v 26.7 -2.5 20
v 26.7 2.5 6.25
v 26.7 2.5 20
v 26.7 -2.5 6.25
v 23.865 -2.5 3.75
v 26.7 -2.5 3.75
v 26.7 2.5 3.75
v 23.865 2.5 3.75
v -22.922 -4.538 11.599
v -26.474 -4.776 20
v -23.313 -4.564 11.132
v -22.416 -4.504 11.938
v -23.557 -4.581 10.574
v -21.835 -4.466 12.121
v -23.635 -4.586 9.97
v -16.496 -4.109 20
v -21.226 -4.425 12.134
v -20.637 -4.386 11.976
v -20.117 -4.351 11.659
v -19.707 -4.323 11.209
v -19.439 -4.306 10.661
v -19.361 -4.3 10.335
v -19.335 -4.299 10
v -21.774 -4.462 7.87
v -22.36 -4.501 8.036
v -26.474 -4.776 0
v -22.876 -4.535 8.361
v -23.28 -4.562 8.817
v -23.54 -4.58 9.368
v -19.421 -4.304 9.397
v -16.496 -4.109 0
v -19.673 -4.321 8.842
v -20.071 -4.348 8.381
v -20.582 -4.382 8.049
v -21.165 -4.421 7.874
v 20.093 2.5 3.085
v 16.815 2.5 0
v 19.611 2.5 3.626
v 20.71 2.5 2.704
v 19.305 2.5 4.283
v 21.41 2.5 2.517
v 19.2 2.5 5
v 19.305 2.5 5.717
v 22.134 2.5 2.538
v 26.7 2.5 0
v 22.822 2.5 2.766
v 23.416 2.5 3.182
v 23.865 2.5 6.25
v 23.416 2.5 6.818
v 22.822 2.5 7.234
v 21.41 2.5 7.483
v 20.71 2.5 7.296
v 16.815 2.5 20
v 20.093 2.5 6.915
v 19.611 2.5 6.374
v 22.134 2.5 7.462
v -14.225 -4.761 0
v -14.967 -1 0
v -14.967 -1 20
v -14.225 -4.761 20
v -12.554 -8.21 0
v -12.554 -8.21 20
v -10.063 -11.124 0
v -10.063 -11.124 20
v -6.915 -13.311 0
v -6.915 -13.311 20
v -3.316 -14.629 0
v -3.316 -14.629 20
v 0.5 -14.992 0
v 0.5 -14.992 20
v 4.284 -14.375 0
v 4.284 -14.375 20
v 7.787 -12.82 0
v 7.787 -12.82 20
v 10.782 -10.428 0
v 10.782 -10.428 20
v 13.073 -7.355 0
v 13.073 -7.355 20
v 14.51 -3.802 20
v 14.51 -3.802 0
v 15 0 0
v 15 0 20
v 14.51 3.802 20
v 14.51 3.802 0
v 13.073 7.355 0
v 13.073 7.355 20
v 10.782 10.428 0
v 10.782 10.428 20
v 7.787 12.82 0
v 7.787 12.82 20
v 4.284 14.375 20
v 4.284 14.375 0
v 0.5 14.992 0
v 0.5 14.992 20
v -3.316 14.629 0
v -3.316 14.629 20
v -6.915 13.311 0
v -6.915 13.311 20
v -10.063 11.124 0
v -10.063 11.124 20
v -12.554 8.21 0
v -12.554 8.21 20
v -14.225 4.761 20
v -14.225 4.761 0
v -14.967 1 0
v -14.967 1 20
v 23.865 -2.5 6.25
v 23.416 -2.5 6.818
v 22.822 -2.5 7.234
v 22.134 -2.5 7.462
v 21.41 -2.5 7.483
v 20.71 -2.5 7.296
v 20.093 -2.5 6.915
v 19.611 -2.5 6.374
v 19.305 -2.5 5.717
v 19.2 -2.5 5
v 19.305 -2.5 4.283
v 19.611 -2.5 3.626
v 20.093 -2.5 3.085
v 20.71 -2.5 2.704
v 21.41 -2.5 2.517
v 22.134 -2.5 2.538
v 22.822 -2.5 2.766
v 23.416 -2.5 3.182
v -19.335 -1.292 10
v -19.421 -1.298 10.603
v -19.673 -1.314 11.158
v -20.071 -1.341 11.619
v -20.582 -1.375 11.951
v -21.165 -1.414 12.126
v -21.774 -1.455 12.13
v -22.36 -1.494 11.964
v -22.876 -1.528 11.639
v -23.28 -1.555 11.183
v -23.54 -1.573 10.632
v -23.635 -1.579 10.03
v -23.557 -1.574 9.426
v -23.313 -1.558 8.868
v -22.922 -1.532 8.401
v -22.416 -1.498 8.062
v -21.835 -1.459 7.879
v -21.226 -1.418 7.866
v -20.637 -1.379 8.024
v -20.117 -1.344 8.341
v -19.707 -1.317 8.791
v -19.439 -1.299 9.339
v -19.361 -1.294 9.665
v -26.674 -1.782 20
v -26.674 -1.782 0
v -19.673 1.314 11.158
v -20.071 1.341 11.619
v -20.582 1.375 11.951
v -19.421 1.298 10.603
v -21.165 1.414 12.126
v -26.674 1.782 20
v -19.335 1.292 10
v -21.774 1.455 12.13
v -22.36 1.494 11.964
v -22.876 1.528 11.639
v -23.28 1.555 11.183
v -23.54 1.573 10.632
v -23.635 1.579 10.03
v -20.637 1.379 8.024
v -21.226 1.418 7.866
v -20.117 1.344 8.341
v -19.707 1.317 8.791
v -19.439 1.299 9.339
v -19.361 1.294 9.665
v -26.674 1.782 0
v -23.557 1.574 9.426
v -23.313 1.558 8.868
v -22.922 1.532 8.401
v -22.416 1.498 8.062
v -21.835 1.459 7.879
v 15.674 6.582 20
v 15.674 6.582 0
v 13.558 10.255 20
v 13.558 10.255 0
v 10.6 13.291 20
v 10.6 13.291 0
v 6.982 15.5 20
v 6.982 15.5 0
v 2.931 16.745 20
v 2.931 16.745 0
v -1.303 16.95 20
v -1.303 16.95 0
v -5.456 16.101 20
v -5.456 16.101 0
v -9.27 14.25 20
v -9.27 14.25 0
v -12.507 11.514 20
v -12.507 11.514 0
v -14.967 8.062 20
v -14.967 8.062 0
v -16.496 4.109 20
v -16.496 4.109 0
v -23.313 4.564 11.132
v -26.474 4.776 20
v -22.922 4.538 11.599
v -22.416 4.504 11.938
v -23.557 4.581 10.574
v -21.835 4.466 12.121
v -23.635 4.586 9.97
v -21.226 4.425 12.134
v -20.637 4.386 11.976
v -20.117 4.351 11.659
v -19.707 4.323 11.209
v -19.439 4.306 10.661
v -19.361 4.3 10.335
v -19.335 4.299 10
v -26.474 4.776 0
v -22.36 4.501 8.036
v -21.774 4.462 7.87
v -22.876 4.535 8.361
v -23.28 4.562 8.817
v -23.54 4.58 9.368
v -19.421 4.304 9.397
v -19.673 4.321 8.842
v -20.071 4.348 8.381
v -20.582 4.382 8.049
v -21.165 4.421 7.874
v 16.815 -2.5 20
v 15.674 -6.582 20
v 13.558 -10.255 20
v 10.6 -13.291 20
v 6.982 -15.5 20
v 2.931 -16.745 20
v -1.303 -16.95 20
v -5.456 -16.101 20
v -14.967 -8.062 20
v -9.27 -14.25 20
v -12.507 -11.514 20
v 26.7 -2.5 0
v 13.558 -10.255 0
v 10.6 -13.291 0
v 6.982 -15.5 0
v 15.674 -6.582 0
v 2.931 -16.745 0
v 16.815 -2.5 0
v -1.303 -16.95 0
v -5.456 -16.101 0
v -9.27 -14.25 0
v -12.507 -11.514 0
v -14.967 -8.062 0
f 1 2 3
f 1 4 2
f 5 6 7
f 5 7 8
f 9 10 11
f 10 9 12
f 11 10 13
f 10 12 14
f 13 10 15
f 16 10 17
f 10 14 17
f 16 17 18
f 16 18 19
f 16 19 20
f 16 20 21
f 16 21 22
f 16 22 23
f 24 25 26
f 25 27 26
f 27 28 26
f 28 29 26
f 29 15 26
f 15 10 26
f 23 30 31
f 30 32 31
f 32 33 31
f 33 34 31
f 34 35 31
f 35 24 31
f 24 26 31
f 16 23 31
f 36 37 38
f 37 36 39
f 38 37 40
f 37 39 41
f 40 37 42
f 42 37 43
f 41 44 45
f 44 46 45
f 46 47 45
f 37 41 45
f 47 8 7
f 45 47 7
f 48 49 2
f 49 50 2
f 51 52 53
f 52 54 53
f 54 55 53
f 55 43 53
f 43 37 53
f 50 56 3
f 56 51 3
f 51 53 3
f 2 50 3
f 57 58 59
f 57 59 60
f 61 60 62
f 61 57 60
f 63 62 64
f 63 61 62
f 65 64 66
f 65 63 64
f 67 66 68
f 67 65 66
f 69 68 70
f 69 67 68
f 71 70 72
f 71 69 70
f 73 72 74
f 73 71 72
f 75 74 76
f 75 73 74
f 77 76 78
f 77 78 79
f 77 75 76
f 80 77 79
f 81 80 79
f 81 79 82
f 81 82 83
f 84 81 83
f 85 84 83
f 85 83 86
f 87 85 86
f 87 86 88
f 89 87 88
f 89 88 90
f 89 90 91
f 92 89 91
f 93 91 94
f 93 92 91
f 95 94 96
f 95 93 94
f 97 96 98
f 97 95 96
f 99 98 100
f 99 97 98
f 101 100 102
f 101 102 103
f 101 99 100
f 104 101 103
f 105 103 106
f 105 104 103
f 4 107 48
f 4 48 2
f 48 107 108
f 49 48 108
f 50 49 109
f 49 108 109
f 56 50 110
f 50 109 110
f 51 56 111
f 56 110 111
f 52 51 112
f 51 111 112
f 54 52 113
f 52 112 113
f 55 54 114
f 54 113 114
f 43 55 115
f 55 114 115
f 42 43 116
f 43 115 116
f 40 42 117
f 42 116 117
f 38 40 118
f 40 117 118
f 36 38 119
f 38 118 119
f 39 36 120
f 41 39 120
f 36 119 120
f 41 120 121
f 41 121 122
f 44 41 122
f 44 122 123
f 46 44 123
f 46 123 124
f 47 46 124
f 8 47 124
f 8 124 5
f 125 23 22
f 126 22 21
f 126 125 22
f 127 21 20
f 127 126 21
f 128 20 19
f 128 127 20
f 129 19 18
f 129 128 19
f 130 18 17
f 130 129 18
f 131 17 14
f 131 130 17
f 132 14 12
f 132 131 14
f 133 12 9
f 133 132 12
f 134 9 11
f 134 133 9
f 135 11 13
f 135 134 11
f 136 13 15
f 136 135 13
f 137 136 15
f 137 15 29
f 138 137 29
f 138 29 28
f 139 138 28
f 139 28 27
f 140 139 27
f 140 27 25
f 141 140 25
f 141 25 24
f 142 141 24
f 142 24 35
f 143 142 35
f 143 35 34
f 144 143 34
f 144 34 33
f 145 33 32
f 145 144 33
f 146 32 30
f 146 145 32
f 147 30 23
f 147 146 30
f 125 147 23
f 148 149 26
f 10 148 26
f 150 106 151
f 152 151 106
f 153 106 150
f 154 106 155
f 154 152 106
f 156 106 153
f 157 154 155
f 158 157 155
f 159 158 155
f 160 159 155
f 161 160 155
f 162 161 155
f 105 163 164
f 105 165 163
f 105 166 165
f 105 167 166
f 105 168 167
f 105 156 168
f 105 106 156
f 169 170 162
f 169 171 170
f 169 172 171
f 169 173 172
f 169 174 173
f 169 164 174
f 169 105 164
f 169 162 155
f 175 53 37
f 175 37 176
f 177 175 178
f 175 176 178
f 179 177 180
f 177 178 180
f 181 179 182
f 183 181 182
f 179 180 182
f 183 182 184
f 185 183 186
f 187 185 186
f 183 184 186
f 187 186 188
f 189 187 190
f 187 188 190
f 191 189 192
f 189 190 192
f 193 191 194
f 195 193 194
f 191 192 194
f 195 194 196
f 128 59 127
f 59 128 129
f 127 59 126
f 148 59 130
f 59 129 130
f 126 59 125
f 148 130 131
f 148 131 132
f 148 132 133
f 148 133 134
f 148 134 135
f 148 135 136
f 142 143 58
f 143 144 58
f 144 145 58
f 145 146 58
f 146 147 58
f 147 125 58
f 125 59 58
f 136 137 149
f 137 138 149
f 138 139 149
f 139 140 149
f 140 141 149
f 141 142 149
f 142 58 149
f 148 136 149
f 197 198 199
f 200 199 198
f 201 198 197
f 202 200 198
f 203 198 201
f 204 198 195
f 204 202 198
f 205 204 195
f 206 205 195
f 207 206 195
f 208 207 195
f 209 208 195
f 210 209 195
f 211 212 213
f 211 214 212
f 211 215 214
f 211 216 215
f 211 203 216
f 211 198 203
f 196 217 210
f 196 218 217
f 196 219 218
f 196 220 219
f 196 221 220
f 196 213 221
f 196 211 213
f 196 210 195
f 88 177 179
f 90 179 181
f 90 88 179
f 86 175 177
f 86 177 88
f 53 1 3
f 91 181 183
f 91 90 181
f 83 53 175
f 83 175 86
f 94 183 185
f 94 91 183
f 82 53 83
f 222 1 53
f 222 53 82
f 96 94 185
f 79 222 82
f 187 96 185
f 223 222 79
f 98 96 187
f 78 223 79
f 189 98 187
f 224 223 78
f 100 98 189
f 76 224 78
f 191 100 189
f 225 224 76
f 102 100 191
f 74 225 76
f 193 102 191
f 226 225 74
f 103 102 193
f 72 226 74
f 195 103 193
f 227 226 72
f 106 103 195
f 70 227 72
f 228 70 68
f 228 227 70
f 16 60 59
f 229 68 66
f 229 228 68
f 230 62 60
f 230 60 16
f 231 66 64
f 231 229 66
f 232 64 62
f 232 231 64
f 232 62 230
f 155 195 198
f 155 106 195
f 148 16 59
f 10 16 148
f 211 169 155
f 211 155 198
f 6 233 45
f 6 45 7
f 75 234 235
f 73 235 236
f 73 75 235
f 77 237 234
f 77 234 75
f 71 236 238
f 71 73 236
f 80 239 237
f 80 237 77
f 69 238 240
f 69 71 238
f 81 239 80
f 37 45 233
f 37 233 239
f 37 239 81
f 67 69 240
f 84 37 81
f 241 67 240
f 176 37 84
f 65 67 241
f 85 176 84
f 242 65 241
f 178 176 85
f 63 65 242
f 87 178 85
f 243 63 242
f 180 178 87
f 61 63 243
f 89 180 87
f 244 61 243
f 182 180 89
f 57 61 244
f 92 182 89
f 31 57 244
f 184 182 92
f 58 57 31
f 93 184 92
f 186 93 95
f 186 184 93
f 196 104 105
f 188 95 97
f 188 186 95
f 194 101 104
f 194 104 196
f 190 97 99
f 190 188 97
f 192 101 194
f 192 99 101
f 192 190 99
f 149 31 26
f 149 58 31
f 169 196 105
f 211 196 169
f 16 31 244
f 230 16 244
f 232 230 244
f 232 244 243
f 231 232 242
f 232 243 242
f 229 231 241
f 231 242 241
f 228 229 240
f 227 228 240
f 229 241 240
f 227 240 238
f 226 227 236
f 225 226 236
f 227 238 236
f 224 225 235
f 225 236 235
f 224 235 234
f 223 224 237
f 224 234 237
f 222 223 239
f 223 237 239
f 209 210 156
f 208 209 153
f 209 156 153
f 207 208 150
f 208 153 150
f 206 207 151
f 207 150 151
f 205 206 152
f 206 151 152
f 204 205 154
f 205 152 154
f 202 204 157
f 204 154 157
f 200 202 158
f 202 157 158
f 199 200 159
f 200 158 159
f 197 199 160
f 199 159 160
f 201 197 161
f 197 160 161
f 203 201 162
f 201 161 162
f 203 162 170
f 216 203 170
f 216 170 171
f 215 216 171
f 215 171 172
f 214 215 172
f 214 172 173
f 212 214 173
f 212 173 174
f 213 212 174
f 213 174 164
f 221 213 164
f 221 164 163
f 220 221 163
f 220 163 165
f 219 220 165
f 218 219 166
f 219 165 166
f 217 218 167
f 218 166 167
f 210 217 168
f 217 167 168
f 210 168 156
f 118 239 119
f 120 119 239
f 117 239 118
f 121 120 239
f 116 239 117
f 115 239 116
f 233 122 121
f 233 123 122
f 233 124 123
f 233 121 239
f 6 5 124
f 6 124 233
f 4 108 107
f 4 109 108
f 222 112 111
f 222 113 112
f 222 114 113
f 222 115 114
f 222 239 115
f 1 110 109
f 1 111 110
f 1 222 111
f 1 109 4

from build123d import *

# Parameters (mm, degrees)
PAD_DEPTH         = 20
SKETCH001_R       = 2.15
POCKET_DEPTH      = 17.001
POCKET_DEPTH_BACK = -17.001
PAD001_DEPTH      = 2.5


with BuildPart() as part:
    # Sketch → Pad (new body)
    with BuildSketch(Plane.XY):
        with BuildLine():
            ThreePointArc((-14.96663, -1), (15, 0), (-14.96663, 1))
            Line((-14.96663, 1), (-26.673727, 1.782213))
            Line((-26.673727, 1.782213), (-26.473727, 4.775539))
            Line((-26.473727, 4.775539), (-16.495974, 4.108873))
            ThreePointArc((-16.495974, -4.108873), (17, 0), (-16.495974, 4.108873))
            Line((-26.473727, -4.775539), (-16.495974, -4.108873))
            Line((-26.673727, -1.782213), (-26.473727, -4.775539))
            Line((-14.96663, -1), (-26.673727, -1.782213))
        make_face()
    extrude(amount=PAD_DEPTH)

    # Sketch001 → Pocket (cut, two sides)
    with BuildSketch(Plane.XZ) as pocket_sk:
        with Locations((-21.484851, 10)):
            Circle(SKETCH001_R)
    extrude(amount=-POCKET_DEPTH, mode=Mode.SUBTRACT)
    extrude(pocket_sk.sketch, amount=-POCKET_DEPTH_BACK, mode=Mode.SUBTRACT)

    # Sketch002 → Pad001 (join, symmetric)
    with BuildSketch(Plane.XZ):
        with BuildLine():
            Line((16.7, 20), (16.7, 0))
            Line((16.7, 0), (26.7, 0))
            Line((26.7, 0), (26.7, 3.75))
            Line((26.7, 3.75), (23.865064, 3.75))
            ThreePointArc((23.865064, 6.25), (19.2, 5), (23.865064, 3.75))
            Line((23.865064, 6.25), (26.7, 6.25))
            Line((26.7, 6.25), (26.7, 20))
            Line((26.7, 20), (16.7, 20))
        make_face()
    extrude(amount=PAD001_DEPTH, both=True)


solid = part.part
